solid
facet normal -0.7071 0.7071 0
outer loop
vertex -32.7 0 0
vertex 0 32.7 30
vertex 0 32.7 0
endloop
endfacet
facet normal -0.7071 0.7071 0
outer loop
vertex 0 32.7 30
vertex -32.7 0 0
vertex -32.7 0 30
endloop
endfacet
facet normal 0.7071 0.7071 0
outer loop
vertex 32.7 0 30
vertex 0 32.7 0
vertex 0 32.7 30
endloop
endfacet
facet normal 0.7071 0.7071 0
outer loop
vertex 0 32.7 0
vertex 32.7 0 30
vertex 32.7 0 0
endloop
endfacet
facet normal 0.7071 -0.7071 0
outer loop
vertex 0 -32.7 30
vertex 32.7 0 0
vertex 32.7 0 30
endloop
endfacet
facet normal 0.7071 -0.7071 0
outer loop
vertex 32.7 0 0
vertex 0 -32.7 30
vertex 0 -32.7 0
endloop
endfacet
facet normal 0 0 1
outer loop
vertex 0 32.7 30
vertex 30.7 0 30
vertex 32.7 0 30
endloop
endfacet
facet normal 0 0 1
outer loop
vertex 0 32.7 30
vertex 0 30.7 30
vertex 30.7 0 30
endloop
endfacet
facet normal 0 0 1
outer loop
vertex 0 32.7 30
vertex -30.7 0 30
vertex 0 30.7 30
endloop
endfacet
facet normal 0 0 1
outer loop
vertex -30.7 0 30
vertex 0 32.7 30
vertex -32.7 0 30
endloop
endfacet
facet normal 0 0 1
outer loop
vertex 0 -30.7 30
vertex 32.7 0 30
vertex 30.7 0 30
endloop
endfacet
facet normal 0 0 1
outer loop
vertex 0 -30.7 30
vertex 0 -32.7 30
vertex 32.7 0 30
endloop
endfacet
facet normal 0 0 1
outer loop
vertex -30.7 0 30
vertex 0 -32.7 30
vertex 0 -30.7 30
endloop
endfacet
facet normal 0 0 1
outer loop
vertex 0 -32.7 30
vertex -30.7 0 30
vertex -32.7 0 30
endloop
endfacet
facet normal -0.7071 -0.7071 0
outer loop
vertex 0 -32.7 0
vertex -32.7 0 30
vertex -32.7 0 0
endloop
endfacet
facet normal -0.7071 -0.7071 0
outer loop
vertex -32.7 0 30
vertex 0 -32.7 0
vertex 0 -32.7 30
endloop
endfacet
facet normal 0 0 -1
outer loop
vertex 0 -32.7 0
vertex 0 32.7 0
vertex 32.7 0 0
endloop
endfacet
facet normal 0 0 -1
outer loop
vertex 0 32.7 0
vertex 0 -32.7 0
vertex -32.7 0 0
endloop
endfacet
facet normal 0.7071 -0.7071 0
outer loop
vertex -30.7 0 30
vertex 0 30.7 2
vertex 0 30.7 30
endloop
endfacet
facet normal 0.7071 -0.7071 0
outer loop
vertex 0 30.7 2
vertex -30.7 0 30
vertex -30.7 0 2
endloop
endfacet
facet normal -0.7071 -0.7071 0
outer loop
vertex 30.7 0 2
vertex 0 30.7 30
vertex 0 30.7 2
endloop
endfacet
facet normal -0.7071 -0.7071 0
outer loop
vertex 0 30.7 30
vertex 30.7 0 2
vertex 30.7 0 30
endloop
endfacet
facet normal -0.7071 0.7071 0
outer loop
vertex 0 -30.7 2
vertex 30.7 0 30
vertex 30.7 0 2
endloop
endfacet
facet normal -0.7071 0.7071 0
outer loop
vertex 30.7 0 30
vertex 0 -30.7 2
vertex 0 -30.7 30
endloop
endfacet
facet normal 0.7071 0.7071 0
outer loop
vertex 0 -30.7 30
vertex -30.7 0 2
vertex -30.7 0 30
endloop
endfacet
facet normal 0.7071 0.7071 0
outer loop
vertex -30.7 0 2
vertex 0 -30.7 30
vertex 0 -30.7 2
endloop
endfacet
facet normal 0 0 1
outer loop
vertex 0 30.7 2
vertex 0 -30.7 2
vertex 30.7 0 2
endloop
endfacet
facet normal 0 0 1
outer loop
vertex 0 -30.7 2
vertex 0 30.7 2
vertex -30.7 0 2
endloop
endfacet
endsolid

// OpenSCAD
difference(){
cylinder(h=30,r=10*sqrt(3*PI)+2,$fn=4);
    translate([0,0,2])
    cylinder(h=28.5,r=10*sqrt(3*PI),$fn=4);
}
